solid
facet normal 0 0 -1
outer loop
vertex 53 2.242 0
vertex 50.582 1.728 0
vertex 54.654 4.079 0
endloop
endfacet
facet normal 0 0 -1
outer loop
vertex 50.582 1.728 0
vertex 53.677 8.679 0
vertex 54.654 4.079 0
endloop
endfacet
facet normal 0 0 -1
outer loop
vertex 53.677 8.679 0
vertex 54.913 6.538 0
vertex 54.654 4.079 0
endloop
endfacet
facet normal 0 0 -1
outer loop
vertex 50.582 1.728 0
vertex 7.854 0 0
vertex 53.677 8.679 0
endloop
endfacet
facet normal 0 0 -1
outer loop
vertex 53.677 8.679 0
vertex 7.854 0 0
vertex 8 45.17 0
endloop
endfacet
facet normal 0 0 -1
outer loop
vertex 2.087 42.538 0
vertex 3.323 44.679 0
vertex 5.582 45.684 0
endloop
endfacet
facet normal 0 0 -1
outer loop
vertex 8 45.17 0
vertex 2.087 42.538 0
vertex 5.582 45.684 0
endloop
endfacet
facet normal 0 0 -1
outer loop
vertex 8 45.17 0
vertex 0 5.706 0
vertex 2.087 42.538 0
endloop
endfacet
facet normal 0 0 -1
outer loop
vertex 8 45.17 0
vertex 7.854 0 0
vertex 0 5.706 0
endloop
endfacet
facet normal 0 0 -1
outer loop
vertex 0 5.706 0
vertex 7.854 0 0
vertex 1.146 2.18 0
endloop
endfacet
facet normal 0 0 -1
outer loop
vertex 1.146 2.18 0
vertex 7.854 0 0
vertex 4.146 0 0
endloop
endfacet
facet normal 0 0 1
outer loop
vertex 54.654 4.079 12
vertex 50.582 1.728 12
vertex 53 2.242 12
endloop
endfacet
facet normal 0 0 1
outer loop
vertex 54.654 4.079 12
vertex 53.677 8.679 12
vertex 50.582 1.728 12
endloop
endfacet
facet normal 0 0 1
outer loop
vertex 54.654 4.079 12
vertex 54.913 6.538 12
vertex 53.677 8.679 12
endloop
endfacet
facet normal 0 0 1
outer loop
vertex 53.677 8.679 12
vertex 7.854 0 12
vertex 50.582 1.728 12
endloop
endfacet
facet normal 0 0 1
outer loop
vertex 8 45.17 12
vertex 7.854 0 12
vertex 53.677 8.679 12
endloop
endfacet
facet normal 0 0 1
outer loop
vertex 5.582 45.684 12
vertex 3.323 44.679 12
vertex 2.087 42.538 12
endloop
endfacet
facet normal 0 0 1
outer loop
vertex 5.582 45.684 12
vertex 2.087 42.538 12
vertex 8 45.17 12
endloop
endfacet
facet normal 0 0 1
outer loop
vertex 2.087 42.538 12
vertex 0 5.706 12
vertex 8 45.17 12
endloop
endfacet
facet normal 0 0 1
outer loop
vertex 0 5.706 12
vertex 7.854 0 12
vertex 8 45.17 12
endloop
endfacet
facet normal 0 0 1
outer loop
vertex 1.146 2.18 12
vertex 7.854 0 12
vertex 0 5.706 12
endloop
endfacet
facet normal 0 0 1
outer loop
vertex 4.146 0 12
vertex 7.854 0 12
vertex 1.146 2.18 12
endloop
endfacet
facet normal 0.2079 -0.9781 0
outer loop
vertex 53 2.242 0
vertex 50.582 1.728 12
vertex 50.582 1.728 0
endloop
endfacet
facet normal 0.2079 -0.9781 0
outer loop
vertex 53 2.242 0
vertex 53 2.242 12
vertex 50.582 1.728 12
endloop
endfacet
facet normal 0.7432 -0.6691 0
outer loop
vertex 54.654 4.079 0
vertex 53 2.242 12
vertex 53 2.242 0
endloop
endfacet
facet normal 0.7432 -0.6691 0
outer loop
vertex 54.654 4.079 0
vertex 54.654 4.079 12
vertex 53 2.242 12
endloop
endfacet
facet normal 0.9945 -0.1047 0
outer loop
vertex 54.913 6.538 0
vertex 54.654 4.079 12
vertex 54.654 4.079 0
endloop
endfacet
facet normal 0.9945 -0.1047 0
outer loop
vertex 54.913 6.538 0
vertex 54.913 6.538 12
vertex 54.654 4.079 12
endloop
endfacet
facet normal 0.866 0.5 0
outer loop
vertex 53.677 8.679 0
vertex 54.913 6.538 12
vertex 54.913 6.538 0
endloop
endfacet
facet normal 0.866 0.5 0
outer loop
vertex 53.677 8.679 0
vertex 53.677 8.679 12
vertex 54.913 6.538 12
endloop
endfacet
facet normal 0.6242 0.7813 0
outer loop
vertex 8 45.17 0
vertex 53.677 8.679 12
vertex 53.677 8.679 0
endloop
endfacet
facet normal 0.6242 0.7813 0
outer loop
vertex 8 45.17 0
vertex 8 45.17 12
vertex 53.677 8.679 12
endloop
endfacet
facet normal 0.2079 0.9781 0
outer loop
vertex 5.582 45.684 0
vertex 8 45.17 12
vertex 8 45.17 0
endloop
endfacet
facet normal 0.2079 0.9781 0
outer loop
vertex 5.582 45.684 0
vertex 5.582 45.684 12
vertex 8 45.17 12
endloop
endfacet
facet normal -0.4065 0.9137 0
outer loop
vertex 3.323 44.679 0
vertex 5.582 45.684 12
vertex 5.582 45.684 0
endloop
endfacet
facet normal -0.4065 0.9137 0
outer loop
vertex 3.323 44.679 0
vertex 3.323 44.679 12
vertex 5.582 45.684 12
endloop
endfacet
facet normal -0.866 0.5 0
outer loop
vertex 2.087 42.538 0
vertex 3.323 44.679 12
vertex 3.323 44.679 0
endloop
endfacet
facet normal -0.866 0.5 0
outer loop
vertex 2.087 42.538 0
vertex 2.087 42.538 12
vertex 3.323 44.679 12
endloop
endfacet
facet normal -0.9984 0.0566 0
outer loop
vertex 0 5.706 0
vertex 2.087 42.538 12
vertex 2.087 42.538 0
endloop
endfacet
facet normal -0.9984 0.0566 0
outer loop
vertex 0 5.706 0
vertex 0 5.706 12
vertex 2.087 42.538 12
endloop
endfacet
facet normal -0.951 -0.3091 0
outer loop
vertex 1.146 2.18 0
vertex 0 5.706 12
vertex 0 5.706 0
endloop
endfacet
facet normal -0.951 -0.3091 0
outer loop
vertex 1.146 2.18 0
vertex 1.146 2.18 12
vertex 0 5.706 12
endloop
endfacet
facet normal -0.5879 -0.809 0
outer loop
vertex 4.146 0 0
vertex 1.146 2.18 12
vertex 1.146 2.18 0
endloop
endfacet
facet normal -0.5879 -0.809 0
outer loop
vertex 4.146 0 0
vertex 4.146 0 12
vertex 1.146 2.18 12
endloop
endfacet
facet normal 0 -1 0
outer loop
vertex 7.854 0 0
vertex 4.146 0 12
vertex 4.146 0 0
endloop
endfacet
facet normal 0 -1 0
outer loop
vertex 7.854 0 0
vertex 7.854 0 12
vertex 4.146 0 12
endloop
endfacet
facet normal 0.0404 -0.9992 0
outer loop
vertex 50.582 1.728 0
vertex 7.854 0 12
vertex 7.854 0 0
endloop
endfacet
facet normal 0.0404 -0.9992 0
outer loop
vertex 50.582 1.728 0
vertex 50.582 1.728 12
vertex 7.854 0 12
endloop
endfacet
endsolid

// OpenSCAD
$fn = 32;

// ----------------------------------------------------------------------
// Lever arm: two bosses 12 and 8 mm, 45 mm between centres
// ----------------------------------------------------------------------

// --- parameters (mm) ---
profile_height = 12;      // extrusion height
profile_points = 13;      // points of the closed outline

profile = [[0, 5.706], [1.146, 2.18], [4.146, 0], [7.854, 0], [50.582, 1.728], [53, 2.242], [54.654, 4.079], [54.913, 6.538], [53.677, 8.679], [8, 45.17], [5.582, 45.684], [3.323, 44.679], [2.087, 42.538]];  // single closed polygon, 13 points, counter clockwise

// --- the one profile operation ---
linear_extrude(height = profile_height) polygon(points = profile);
